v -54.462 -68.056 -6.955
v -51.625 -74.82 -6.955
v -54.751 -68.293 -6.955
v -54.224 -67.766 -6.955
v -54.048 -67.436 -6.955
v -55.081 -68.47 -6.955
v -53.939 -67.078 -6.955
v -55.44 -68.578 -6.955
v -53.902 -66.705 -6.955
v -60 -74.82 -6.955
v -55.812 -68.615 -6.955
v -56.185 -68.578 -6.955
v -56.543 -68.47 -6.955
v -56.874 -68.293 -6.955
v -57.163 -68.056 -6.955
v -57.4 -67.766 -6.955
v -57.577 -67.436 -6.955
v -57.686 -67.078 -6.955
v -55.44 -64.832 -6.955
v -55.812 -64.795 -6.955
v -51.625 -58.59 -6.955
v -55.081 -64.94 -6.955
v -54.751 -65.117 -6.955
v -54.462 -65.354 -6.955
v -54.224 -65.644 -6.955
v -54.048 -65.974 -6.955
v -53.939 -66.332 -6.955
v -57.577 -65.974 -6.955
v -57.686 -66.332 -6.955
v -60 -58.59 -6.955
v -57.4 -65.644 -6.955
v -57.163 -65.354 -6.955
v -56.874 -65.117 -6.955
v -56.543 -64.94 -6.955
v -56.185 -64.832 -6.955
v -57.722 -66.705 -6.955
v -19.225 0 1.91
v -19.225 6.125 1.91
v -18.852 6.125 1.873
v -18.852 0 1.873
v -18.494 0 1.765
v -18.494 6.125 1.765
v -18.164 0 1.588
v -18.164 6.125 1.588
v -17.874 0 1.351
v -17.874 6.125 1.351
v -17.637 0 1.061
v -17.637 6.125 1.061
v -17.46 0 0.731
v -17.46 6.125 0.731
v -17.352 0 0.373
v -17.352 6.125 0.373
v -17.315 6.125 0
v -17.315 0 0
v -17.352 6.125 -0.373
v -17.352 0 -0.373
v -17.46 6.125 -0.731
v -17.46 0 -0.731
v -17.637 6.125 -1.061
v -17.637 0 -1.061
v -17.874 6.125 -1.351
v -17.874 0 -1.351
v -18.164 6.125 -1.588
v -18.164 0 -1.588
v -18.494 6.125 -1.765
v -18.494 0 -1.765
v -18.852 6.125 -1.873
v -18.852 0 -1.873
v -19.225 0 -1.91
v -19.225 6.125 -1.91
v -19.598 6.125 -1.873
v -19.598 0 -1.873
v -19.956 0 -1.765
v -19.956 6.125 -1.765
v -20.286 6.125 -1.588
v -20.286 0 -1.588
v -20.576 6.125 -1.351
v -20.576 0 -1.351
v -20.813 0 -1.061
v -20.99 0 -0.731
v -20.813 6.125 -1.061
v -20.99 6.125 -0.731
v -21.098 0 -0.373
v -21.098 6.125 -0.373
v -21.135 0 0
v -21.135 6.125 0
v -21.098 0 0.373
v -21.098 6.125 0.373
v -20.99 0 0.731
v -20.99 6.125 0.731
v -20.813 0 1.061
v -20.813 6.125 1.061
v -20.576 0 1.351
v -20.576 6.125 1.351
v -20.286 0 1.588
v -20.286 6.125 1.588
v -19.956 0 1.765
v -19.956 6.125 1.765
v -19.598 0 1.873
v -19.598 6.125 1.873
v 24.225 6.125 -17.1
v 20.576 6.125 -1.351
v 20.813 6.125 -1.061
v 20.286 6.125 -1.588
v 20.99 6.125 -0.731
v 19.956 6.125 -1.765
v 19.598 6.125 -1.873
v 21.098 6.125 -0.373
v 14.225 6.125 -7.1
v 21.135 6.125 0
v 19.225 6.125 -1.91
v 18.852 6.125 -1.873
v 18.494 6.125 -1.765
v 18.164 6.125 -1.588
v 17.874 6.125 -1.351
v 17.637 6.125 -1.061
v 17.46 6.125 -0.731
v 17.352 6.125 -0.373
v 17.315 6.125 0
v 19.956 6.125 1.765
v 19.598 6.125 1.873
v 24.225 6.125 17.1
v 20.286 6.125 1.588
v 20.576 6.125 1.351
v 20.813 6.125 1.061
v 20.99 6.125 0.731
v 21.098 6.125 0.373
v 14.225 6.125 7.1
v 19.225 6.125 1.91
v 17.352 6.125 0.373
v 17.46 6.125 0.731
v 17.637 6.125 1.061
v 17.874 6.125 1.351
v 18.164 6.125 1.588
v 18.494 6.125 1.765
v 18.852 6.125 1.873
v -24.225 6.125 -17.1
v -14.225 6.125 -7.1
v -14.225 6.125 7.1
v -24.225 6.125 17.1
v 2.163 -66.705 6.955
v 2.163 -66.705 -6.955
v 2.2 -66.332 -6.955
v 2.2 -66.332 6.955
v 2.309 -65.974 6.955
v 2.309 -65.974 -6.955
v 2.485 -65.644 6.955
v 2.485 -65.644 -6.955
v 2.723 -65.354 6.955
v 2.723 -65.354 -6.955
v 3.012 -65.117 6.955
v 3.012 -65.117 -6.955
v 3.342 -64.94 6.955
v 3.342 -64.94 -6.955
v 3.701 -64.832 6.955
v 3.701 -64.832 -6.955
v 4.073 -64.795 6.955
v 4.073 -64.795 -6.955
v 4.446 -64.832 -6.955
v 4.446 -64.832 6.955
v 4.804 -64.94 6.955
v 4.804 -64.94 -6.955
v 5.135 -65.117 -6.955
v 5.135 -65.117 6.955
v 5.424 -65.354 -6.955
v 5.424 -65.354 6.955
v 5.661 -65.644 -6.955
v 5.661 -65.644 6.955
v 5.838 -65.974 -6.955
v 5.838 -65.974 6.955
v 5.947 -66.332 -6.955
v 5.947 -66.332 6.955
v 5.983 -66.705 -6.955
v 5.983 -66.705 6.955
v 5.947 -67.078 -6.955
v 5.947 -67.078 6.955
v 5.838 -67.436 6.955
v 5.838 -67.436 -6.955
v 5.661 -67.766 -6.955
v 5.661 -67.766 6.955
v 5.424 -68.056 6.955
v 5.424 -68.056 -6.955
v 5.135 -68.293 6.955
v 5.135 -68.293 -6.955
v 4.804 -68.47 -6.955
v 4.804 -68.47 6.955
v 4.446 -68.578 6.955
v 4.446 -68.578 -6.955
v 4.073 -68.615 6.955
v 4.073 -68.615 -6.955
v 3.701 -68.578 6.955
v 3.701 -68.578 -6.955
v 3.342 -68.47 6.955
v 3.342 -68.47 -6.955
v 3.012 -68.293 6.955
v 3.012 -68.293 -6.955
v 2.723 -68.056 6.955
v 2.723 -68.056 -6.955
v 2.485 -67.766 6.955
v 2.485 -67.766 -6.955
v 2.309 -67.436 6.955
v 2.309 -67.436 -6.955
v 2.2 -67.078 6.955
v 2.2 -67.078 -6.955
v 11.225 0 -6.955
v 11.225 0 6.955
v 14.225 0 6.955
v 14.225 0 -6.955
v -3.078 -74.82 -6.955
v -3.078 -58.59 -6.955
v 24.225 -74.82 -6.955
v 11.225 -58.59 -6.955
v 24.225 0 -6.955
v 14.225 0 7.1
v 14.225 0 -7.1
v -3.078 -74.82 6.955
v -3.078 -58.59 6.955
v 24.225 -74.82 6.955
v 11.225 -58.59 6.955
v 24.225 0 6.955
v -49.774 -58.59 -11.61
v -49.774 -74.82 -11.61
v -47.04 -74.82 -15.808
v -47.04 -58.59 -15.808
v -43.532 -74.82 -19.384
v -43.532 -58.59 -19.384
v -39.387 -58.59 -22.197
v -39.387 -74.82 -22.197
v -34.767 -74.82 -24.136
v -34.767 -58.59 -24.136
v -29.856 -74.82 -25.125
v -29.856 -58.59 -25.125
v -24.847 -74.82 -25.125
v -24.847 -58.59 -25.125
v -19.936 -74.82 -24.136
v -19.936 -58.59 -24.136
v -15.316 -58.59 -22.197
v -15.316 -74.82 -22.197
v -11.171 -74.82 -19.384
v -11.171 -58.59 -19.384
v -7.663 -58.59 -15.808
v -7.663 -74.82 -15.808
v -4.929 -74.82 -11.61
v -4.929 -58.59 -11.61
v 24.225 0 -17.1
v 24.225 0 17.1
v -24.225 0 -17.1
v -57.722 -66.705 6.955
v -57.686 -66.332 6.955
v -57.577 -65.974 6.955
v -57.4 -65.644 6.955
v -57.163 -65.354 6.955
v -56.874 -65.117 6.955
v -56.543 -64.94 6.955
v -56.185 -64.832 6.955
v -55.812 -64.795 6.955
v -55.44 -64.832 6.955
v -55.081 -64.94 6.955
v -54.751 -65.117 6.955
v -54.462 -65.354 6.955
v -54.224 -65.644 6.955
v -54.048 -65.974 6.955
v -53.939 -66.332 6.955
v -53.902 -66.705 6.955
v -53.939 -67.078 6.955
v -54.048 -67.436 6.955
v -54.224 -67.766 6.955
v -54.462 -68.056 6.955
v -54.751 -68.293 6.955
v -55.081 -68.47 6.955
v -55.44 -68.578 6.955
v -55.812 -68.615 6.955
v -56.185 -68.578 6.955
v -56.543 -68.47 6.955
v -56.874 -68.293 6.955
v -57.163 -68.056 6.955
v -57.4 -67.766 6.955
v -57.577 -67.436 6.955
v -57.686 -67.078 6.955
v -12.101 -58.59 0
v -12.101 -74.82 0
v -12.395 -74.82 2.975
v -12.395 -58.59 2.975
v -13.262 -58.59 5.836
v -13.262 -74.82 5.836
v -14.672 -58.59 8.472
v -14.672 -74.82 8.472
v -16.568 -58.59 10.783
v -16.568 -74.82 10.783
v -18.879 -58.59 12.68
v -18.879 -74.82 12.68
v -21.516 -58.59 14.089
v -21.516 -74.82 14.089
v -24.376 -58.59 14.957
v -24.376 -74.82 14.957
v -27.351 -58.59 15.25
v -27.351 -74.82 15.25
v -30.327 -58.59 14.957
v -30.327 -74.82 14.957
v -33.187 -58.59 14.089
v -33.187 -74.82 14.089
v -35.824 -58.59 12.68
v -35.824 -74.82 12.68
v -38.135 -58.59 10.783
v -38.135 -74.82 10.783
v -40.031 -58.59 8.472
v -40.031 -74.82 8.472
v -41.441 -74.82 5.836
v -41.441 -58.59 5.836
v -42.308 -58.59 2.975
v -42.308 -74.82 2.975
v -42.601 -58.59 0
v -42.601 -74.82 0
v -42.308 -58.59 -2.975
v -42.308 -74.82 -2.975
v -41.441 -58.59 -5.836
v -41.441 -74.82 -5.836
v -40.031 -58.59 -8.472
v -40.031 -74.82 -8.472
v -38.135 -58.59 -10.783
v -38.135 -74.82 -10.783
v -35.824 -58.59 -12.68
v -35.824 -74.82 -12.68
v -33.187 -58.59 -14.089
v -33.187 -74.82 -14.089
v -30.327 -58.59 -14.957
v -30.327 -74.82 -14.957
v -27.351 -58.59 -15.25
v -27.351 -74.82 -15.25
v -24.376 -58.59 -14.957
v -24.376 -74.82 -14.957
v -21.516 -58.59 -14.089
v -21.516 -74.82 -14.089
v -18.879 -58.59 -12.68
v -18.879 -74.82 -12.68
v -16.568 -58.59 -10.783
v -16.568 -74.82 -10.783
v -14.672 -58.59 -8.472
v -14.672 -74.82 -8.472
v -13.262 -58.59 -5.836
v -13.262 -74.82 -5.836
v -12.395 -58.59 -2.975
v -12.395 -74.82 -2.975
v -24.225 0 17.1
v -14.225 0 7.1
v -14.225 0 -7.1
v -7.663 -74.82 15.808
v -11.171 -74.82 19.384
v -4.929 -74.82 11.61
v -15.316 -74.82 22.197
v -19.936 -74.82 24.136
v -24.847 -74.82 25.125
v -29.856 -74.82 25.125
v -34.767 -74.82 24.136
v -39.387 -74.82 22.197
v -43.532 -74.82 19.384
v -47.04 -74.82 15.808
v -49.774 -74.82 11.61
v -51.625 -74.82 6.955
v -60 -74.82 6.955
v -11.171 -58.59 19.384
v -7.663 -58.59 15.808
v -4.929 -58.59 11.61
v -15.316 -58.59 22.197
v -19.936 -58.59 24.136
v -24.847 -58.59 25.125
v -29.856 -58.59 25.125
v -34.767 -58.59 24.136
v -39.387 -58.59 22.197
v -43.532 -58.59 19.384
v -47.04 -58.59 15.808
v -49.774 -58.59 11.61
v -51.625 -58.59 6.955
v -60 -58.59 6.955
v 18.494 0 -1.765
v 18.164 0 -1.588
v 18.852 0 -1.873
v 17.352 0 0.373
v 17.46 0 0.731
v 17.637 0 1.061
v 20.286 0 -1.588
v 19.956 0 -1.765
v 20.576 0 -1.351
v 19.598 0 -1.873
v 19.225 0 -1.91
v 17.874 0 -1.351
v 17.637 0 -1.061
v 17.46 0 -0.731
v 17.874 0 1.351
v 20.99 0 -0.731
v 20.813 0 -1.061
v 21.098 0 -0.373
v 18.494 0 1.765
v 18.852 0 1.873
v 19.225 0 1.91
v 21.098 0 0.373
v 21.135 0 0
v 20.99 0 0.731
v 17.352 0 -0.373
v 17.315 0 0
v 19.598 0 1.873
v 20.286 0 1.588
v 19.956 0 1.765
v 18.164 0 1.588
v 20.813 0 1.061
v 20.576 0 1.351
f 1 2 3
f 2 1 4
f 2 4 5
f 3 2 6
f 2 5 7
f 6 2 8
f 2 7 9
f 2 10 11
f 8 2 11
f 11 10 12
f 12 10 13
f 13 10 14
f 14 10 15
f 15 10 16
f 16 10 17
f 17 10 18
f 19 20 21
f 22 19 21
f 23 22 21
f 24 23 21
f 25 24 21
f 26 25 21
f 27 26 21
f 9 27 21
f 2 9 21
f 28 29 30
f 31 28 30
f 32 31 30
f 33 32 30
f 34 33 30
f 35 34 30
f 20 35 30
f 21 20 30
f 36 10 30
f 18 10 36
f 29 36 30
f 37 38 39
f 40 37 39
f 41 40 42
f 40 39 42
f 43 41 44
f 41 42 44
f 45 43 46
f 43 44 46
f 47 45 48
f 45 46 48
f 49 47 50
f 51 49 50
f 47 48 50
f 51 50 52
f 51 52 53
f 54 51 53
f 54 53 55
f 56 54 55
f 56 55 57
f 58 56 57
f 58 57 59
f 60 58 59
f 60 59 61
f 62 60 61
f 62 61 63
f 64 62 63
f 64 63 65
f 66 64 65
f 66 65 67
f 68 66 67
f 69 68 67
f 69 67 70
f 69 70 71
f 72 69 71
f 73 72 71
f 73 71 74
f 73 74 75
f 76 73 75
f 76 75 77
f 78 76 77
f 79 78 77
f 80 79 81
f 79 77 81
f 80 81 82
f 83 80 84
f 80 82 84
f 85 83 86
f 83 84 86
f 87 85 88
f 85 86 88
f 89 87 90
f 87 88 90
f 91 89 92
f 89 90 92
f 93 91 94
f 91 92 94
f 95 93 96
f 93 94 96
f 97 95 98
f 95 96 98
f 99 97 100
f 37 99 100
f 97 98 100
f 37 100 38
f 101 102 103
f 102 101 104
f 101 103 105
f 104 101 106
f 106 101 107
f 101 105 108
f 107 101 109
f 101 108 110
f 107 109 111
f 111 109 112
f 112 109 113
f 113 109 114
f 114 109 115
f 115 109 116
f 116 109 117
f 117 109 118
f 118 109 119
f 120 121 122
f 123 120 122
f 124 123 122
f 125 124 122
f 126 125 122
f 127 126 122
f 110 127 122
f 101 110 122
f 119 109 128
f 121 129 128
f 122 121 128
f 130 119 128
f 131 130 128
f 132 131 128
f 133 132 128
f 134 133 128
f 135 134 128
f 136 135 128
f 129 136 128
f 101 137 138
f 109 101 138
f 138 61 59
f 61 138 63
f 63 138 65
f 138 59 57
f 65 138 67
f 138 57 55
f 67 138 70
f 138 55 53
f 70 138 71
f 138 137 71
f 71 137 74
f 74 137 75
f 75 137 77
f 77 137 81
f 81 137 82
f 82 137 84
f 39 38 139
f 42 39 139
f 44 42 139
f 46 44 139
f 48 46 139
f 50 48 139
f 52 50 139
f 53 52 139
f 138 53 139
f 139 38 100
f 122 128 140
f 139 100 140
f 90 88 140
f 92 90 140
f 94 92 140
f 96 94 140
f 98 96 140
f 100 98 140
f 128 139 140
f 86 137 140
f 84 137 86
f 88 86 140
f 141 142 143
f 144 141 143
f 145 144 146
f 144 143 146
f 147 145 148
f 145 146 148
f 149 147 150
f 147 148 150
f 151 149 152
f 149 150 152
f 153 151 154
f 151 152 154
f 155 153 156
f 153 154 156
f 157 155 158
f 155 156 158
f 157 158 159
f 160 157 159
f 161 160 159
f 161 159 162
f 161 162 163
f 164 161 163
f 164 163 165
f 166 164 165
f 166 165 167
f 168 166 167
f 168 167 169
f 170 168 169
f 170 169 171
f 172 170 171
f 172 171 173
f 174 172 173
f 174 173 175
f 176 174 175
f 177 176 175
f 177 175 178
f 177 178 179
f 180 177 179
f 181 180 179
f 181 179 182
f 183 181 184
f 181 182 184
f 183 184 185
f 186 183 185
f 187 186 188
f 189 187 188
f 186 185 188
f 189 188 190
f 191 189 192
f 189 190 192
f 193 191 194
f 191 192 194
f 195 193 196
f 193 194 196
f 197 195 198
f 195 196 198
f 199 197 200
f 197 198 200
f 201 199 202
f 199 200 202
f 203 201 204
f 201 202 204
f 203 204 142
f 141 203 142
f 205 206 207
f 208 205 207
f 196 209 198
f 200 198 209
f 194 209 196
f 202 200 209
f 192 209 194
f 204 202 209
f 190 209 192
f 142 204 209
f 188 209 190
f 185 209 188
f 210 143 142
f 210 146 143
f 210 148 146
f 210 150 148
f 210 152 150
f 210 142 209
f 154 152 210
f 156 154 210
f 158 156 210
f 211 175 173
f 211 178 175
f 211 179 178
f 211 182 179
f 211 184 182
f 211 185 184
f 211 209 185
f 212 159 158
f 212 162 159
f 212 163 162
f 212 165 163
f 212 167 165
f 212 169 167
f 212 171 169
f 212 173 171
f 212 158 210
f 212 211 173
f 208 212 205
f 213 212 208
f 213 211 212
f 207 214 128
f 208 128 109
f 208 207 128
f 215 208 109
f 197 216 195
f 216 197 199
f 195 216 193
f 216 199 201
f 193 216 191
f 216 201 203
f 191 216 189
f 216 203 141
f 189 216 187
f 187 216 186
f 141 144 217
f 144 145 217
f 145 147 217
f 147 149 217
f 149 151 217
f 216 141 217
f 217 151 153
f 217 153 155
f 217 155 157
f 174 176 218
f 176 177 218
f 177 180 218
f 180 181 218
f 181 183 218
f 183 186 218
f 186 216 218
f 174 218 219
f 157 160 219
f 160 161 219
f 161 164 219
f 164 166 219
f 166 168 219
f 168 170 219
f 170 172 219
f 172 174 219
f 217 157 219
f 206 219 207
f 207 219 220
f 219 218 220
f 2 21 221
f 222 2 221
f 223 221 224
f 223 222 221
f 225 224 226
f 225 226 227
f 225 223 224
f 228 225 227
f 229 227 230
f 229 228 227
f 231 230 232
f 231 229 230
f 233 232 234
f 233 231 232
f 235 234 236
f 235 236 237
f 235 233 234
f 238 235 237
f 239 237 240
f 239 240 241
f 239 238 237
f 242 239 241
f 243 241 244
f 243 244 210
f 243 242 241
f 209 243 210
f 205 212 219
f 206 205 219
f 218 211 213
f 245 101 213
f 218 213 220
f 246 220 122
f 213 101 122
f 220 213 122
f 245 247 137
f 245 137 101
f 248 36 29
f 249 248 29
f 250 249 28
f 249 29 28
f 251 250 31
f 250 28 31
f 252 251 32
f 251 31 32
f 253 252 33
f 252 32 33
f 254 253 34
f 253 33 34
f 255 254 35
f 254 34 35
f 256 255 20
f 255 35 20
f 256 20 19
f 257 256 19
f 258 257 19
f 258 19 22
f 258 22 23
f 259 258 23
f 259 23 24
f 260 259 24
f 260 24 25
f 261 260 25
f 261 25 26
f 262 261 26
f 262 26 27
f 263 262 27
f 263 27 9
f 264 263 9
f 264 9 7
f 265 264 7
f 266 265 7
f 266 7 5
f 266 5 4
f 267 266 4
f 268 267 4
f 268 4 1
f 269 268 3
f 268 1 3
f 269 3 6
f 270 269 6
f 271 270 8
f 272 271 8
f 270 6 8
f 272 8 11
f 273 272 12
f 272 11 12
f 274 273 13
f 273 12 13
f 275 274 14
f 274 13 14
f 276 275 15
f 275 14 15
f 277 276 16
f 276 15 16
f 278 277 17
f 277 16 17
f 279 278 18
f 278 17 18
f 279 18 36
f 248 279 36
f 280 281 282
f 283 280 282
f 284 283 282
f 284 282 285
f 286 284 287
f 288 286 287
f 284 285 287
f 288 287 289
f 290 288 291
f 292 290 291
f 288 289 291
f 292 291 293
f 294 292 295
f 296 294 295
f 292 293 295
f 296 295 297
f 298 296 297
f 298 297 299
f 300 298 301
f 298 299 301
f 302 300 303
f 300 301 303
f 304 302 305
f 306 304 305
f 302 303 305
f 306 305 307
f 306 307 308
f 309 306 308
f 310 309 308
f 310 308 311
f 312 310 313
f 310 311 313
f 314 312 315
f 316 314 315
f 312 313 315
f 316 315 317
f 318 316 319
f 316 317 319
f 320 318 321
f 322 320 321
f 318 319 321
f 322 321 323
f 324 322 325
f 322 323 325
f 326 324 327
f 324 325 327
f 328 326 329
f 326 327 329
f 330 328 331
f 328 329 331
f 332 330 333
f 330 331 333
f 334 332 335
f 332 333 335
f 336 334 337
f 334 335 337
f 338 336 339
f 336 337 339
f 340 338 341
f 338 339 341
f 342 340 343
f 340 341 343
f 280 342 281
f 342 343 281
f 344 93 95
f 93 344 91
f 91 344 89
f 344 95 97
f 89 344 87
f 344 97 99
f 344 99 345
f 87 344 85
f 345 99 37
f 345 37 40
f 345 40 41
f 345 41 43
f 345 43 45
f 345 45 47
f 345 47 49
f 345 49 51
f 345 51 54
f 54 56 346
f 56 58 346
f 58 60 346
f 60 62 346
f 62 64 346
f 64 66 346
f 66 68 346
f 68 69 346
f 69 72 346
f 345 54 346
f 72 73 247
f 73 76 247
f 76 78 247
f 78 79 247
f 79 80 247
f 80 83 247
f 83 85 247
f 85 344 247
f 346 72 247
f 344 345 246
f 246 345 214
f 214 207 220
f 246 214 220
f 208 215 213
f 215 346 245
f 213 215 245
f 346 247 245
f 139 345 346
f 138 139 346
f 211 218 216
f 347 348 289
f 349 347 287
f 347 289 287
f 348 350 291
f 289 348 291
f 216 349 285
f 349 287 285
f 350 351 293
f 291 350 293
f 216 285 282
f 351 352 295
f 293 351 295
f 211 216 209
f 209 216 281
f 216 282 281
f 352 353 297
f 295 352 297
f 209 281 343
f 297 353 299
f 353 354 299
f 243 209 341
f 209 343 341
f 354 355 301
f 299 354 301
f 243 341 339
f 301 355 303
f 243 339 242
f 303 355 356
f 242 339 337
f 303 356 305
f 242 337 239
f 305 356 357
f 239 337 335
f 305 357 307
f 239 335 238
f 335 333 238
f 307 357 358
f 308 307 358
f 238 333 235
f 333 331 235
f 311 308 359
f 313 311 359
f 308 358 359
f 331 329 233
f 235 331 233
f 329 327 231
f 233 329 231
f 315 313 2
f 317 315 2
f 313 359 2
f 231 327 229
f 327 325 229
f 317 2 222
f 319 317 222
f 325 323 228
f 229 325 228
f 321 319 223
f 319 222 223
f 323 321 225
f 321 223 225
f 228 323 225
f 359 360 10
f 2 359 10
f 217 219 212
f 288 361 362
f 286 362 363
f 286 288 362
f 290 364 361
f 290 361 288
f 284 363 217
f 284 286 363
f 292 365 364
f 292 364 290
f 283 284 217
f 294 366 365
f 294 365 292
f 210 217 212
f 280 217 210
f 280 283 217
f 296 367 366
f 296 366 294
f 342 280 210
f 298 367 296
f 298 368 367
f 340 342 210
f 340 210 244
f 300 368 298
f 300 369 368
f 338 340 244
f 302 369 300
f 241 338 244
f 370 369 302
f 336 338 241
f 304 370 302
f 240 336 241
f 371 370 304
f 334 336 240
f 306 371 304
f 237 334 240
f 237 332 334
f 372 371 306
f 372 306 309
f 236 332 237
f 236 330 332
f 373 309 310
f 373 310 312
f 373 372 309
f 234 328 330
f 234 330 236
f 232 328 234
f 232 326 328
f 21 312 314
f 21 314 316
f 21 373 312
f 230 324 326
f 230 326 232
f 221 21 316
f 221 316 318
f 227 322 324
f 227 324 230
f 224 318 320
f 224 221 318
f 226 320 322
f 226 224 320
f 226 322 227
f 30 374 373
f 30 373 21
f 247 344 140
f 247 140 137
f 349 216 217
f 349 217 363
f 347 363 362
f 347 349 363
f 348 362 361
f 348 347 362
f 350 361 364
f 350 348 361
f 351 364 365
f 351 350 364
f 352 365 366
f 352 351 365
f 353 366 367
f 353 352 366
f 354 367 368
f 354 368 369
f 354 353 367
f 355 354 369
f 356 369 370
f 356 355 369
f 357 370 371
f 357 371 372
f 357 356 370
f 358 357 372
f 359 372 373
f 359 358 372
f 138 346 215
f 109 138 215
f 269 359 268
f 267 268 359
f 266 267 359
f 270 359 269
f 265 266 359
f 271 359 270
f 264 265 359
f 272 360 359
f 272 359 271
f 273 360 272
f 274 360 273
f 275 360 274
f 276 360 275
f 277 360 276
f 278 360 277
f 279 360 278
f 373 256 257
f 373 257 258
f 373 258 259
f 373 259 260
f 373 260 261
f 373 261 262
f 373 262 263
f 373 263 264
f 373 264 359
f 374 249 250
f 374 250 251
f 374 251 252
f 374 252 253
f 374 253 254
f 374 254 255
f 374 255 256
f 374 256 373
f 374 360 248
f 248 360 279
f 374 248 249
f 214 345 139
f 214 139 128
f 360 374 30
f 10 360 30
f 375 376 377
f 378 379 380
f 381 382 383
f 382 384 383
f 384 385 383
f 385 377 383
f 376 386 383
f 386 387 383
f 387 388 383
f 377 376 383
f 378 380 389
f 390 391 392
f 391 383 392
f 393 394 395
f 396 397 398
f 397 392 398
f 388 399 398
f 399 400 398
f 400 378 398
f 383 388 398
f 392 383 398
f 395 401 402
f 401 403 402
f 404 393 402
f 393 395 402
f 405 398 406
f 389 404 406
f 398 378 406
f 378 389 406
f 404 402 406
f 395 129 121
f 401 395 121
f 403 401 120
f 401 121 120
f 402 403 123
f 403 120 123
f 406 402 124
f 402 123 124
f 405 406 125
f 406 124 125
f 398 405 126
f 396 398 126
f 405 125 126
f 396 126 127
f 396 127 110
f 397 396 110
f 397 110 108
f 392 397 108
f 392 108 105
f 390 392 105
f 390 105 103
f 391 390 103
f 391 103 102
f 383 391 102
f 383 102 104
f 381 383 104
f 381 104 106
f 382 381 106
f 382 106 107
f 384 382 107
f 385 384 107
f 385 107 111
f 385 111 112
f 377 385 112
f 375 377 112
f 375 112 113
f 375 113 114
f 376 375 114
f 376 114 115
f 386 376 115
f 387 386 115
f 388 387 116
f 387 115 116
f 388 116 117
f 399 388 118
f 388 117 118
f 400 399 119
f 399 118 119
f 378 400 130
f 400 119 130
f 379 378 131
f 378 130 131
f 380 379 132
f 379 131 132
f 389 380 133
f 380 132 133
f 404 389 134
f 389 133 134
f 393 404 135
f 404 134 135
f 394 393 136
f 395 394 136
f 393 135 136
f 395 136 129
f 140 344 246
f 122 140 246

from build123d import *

# Parameters (mm, degrees)
SKETCH_1_W          = 48.45
SKETCH_1_H          = 34.2
SKETCH_1_W_2        = 28.45
SKETCH_1_H_2        = 14.2
EXTRUDE_1_DEPTH     = 12.25
SKETCH_2_R          = 1.91
CUT_EXTRUDE_1_DEPTH = 33.083066016
SKETCH_4_W          = 13
SKETCH_4_H          = 13.91
EXTRUDE_1_2_DEPTH   = 74.82
SKETCH_5_W          = 13.91
SKETCH_5_H          = 16.23
EXTRUDE_2_DEPTH     = 16
SKETCH_7_R          = 25.25
SKETCH_7_R_2        = 15.25
EXTRUDE_2_2_DEPTH   = 16.23
SKETCH_15_R         = 1.91
CUT_EXTRUDE_6_DEPTH = 97.964478439
SKETCH_16_W         = 13.91
SKETCH_16_H         = 16.23
EXTRUDE_4_DEPTH     = 10
SKETCH_17_R         = 1.91
CUT_EXTRUDE_7_DEPTH = 102.16913771
SKETCH_18_W         = 48.429544624
SKETCH_18_H         = 6.125
CUT_EXTRUDE_8_DEPTH = 105.840616652
SKETCH_19_W         = 34.2
SKETCH_19_H         = 6.125
CUT_EXTRUDE_9_DEPTH = 10


with BuildPart() as part:
    # 草圖1 → Extrude 1 (new body)
    with BuildSketch(Plane(origin=(0, 0, 0), x_dir=(1, 0, 0), z_dir=(0, 1, 0))):
        Rectangle(SKETCH_1_W, SKETCH_1_H)
        Rectangle(SKETCH_1_W_2, SKETCH_1_H_2, mode=Mode.SUBTRACT)
    extrude(amount=EXTRUDE_1_DEPTH)

    # 草圖2 → 除料-伸長1 (cut, through all)
    with BuildSketch(Plane(origin=(0, 12.25, 0), x_dir=(1, 0, 0), z_dir=(0, 1, 0))):
        with Locations(Location((-19.225, 0, 0), (0, 0, 270))):
            Circle(SKETCH_2_R)
        with Locations(Location((19.225, 0, 0), (0, 0, 270))):
            Circle(SKETCH_2_R)
    extrude(amount=-CUT_EXTRUDE_1_DEPTH, mode=Mode.SUBTRACT)

    # 草圖4 → Extrude 1 2 (add)
    with BuildSketch(Plane.XZ):
        with Locations((17.725, 0)):
            Rectangle(SKETCH_4_W, SKETCH_4_H)
    extrude(amount=EXTRUDE_1_2_DEPTH)

    # 草圖5 → Extrude 2 (add)
    with BuildSketch(Plane.ZY.offset(-11.225)):
        with Locations((0, -66.705)):
            Rectangle(SKETCH_5_W, SKETCH_5_H)
    extrude(amount=EXTRUDE_2_DEPTH)

    # 草圖7 → Extrude 2 2 (add)
    with BuildSketch(Plane(origin=(3.626674765, -74.82, 0), x_dir=(1, 0, 0), z_dir=(0, -1, 0))):
        with Locations((-30.978154344, 0)):
            Circle(SKETCH_7_R)
        with Locations((-30.978154344, 0)):
            Circle(SKETCH_7_R_2, mode=Mode.SUBTRACT)
    extrude(amount=-EXTRUDE_2_2_DEPTH)

    # 草圖15 → 除料-伸長6 (cut, through all)
    with BuildSketch(Plane(origin=(0, 0, -6.955), x_dir=(-1, 0, 0), z_dir=(0, 0, -1))):
        with Locations((-4.073383248, -66.705)):
            Circle(SKETCH_15_R)
    extrude(amount=-CUT_EXTRUDE_6_DEPTH, mode=Mode.SUBTRACT)

    # 草圖16 → 填料-伸長4 (add)
    with BuildSketch(Plane(origin=(-60, 0, 0), x_dir=(0, 0, -1), z_dir=(1, 0, 0))):
        with Locations((0, -66.705)):
            Rectangle(SKETCH_16_W, SKETCH_16_H)
    extrude(amount=EXTRUDE_4_DEPTH)

    # 草圖17 → 除料-伸長7 (cut, through all)
    with BuildSketch(Plane(origin=(0, 0, -6.955), x_dir=(-1, 0, 0), z_dir=(0, 0, -1))):
        with Locations((55.812362827, -66.705)):
            Circle(SKETCH_17_R)
    extrude(amount=-CUT_EXTRUDE_7_DEPTH, mode=Mode.SUBTRACT)

    # 草圖18 → 除料-伸長8 (cut, through all)
    with BuildSketch(Plane(origin=(0, 0, -17.1), x_dir=(-1, 0, 0), z_dir=(0, 0, -1))):
        with Locations((0.010227688, 9.1875)):
            Rectangle(SKETCH_18_W, SKETCH_18_H)
    extrude(amount=-CUT_EXTRUDE_8_DEPTH, mode=Mode.SUBTRACT)

    # 草圖19 → 除料-伸長9 (cut)
    with BuildSketch(Plane.ZY.offset(-24.204544624)):
        with Locations((0, 9.1875)):
            Rectangle(SKETCH_19_W, SKETCH_19_H)
    extrude(amount=-CUT_EXTRUDE_9_DEPTH, mode=Mode.SUBTRACT)


solid = part.part
